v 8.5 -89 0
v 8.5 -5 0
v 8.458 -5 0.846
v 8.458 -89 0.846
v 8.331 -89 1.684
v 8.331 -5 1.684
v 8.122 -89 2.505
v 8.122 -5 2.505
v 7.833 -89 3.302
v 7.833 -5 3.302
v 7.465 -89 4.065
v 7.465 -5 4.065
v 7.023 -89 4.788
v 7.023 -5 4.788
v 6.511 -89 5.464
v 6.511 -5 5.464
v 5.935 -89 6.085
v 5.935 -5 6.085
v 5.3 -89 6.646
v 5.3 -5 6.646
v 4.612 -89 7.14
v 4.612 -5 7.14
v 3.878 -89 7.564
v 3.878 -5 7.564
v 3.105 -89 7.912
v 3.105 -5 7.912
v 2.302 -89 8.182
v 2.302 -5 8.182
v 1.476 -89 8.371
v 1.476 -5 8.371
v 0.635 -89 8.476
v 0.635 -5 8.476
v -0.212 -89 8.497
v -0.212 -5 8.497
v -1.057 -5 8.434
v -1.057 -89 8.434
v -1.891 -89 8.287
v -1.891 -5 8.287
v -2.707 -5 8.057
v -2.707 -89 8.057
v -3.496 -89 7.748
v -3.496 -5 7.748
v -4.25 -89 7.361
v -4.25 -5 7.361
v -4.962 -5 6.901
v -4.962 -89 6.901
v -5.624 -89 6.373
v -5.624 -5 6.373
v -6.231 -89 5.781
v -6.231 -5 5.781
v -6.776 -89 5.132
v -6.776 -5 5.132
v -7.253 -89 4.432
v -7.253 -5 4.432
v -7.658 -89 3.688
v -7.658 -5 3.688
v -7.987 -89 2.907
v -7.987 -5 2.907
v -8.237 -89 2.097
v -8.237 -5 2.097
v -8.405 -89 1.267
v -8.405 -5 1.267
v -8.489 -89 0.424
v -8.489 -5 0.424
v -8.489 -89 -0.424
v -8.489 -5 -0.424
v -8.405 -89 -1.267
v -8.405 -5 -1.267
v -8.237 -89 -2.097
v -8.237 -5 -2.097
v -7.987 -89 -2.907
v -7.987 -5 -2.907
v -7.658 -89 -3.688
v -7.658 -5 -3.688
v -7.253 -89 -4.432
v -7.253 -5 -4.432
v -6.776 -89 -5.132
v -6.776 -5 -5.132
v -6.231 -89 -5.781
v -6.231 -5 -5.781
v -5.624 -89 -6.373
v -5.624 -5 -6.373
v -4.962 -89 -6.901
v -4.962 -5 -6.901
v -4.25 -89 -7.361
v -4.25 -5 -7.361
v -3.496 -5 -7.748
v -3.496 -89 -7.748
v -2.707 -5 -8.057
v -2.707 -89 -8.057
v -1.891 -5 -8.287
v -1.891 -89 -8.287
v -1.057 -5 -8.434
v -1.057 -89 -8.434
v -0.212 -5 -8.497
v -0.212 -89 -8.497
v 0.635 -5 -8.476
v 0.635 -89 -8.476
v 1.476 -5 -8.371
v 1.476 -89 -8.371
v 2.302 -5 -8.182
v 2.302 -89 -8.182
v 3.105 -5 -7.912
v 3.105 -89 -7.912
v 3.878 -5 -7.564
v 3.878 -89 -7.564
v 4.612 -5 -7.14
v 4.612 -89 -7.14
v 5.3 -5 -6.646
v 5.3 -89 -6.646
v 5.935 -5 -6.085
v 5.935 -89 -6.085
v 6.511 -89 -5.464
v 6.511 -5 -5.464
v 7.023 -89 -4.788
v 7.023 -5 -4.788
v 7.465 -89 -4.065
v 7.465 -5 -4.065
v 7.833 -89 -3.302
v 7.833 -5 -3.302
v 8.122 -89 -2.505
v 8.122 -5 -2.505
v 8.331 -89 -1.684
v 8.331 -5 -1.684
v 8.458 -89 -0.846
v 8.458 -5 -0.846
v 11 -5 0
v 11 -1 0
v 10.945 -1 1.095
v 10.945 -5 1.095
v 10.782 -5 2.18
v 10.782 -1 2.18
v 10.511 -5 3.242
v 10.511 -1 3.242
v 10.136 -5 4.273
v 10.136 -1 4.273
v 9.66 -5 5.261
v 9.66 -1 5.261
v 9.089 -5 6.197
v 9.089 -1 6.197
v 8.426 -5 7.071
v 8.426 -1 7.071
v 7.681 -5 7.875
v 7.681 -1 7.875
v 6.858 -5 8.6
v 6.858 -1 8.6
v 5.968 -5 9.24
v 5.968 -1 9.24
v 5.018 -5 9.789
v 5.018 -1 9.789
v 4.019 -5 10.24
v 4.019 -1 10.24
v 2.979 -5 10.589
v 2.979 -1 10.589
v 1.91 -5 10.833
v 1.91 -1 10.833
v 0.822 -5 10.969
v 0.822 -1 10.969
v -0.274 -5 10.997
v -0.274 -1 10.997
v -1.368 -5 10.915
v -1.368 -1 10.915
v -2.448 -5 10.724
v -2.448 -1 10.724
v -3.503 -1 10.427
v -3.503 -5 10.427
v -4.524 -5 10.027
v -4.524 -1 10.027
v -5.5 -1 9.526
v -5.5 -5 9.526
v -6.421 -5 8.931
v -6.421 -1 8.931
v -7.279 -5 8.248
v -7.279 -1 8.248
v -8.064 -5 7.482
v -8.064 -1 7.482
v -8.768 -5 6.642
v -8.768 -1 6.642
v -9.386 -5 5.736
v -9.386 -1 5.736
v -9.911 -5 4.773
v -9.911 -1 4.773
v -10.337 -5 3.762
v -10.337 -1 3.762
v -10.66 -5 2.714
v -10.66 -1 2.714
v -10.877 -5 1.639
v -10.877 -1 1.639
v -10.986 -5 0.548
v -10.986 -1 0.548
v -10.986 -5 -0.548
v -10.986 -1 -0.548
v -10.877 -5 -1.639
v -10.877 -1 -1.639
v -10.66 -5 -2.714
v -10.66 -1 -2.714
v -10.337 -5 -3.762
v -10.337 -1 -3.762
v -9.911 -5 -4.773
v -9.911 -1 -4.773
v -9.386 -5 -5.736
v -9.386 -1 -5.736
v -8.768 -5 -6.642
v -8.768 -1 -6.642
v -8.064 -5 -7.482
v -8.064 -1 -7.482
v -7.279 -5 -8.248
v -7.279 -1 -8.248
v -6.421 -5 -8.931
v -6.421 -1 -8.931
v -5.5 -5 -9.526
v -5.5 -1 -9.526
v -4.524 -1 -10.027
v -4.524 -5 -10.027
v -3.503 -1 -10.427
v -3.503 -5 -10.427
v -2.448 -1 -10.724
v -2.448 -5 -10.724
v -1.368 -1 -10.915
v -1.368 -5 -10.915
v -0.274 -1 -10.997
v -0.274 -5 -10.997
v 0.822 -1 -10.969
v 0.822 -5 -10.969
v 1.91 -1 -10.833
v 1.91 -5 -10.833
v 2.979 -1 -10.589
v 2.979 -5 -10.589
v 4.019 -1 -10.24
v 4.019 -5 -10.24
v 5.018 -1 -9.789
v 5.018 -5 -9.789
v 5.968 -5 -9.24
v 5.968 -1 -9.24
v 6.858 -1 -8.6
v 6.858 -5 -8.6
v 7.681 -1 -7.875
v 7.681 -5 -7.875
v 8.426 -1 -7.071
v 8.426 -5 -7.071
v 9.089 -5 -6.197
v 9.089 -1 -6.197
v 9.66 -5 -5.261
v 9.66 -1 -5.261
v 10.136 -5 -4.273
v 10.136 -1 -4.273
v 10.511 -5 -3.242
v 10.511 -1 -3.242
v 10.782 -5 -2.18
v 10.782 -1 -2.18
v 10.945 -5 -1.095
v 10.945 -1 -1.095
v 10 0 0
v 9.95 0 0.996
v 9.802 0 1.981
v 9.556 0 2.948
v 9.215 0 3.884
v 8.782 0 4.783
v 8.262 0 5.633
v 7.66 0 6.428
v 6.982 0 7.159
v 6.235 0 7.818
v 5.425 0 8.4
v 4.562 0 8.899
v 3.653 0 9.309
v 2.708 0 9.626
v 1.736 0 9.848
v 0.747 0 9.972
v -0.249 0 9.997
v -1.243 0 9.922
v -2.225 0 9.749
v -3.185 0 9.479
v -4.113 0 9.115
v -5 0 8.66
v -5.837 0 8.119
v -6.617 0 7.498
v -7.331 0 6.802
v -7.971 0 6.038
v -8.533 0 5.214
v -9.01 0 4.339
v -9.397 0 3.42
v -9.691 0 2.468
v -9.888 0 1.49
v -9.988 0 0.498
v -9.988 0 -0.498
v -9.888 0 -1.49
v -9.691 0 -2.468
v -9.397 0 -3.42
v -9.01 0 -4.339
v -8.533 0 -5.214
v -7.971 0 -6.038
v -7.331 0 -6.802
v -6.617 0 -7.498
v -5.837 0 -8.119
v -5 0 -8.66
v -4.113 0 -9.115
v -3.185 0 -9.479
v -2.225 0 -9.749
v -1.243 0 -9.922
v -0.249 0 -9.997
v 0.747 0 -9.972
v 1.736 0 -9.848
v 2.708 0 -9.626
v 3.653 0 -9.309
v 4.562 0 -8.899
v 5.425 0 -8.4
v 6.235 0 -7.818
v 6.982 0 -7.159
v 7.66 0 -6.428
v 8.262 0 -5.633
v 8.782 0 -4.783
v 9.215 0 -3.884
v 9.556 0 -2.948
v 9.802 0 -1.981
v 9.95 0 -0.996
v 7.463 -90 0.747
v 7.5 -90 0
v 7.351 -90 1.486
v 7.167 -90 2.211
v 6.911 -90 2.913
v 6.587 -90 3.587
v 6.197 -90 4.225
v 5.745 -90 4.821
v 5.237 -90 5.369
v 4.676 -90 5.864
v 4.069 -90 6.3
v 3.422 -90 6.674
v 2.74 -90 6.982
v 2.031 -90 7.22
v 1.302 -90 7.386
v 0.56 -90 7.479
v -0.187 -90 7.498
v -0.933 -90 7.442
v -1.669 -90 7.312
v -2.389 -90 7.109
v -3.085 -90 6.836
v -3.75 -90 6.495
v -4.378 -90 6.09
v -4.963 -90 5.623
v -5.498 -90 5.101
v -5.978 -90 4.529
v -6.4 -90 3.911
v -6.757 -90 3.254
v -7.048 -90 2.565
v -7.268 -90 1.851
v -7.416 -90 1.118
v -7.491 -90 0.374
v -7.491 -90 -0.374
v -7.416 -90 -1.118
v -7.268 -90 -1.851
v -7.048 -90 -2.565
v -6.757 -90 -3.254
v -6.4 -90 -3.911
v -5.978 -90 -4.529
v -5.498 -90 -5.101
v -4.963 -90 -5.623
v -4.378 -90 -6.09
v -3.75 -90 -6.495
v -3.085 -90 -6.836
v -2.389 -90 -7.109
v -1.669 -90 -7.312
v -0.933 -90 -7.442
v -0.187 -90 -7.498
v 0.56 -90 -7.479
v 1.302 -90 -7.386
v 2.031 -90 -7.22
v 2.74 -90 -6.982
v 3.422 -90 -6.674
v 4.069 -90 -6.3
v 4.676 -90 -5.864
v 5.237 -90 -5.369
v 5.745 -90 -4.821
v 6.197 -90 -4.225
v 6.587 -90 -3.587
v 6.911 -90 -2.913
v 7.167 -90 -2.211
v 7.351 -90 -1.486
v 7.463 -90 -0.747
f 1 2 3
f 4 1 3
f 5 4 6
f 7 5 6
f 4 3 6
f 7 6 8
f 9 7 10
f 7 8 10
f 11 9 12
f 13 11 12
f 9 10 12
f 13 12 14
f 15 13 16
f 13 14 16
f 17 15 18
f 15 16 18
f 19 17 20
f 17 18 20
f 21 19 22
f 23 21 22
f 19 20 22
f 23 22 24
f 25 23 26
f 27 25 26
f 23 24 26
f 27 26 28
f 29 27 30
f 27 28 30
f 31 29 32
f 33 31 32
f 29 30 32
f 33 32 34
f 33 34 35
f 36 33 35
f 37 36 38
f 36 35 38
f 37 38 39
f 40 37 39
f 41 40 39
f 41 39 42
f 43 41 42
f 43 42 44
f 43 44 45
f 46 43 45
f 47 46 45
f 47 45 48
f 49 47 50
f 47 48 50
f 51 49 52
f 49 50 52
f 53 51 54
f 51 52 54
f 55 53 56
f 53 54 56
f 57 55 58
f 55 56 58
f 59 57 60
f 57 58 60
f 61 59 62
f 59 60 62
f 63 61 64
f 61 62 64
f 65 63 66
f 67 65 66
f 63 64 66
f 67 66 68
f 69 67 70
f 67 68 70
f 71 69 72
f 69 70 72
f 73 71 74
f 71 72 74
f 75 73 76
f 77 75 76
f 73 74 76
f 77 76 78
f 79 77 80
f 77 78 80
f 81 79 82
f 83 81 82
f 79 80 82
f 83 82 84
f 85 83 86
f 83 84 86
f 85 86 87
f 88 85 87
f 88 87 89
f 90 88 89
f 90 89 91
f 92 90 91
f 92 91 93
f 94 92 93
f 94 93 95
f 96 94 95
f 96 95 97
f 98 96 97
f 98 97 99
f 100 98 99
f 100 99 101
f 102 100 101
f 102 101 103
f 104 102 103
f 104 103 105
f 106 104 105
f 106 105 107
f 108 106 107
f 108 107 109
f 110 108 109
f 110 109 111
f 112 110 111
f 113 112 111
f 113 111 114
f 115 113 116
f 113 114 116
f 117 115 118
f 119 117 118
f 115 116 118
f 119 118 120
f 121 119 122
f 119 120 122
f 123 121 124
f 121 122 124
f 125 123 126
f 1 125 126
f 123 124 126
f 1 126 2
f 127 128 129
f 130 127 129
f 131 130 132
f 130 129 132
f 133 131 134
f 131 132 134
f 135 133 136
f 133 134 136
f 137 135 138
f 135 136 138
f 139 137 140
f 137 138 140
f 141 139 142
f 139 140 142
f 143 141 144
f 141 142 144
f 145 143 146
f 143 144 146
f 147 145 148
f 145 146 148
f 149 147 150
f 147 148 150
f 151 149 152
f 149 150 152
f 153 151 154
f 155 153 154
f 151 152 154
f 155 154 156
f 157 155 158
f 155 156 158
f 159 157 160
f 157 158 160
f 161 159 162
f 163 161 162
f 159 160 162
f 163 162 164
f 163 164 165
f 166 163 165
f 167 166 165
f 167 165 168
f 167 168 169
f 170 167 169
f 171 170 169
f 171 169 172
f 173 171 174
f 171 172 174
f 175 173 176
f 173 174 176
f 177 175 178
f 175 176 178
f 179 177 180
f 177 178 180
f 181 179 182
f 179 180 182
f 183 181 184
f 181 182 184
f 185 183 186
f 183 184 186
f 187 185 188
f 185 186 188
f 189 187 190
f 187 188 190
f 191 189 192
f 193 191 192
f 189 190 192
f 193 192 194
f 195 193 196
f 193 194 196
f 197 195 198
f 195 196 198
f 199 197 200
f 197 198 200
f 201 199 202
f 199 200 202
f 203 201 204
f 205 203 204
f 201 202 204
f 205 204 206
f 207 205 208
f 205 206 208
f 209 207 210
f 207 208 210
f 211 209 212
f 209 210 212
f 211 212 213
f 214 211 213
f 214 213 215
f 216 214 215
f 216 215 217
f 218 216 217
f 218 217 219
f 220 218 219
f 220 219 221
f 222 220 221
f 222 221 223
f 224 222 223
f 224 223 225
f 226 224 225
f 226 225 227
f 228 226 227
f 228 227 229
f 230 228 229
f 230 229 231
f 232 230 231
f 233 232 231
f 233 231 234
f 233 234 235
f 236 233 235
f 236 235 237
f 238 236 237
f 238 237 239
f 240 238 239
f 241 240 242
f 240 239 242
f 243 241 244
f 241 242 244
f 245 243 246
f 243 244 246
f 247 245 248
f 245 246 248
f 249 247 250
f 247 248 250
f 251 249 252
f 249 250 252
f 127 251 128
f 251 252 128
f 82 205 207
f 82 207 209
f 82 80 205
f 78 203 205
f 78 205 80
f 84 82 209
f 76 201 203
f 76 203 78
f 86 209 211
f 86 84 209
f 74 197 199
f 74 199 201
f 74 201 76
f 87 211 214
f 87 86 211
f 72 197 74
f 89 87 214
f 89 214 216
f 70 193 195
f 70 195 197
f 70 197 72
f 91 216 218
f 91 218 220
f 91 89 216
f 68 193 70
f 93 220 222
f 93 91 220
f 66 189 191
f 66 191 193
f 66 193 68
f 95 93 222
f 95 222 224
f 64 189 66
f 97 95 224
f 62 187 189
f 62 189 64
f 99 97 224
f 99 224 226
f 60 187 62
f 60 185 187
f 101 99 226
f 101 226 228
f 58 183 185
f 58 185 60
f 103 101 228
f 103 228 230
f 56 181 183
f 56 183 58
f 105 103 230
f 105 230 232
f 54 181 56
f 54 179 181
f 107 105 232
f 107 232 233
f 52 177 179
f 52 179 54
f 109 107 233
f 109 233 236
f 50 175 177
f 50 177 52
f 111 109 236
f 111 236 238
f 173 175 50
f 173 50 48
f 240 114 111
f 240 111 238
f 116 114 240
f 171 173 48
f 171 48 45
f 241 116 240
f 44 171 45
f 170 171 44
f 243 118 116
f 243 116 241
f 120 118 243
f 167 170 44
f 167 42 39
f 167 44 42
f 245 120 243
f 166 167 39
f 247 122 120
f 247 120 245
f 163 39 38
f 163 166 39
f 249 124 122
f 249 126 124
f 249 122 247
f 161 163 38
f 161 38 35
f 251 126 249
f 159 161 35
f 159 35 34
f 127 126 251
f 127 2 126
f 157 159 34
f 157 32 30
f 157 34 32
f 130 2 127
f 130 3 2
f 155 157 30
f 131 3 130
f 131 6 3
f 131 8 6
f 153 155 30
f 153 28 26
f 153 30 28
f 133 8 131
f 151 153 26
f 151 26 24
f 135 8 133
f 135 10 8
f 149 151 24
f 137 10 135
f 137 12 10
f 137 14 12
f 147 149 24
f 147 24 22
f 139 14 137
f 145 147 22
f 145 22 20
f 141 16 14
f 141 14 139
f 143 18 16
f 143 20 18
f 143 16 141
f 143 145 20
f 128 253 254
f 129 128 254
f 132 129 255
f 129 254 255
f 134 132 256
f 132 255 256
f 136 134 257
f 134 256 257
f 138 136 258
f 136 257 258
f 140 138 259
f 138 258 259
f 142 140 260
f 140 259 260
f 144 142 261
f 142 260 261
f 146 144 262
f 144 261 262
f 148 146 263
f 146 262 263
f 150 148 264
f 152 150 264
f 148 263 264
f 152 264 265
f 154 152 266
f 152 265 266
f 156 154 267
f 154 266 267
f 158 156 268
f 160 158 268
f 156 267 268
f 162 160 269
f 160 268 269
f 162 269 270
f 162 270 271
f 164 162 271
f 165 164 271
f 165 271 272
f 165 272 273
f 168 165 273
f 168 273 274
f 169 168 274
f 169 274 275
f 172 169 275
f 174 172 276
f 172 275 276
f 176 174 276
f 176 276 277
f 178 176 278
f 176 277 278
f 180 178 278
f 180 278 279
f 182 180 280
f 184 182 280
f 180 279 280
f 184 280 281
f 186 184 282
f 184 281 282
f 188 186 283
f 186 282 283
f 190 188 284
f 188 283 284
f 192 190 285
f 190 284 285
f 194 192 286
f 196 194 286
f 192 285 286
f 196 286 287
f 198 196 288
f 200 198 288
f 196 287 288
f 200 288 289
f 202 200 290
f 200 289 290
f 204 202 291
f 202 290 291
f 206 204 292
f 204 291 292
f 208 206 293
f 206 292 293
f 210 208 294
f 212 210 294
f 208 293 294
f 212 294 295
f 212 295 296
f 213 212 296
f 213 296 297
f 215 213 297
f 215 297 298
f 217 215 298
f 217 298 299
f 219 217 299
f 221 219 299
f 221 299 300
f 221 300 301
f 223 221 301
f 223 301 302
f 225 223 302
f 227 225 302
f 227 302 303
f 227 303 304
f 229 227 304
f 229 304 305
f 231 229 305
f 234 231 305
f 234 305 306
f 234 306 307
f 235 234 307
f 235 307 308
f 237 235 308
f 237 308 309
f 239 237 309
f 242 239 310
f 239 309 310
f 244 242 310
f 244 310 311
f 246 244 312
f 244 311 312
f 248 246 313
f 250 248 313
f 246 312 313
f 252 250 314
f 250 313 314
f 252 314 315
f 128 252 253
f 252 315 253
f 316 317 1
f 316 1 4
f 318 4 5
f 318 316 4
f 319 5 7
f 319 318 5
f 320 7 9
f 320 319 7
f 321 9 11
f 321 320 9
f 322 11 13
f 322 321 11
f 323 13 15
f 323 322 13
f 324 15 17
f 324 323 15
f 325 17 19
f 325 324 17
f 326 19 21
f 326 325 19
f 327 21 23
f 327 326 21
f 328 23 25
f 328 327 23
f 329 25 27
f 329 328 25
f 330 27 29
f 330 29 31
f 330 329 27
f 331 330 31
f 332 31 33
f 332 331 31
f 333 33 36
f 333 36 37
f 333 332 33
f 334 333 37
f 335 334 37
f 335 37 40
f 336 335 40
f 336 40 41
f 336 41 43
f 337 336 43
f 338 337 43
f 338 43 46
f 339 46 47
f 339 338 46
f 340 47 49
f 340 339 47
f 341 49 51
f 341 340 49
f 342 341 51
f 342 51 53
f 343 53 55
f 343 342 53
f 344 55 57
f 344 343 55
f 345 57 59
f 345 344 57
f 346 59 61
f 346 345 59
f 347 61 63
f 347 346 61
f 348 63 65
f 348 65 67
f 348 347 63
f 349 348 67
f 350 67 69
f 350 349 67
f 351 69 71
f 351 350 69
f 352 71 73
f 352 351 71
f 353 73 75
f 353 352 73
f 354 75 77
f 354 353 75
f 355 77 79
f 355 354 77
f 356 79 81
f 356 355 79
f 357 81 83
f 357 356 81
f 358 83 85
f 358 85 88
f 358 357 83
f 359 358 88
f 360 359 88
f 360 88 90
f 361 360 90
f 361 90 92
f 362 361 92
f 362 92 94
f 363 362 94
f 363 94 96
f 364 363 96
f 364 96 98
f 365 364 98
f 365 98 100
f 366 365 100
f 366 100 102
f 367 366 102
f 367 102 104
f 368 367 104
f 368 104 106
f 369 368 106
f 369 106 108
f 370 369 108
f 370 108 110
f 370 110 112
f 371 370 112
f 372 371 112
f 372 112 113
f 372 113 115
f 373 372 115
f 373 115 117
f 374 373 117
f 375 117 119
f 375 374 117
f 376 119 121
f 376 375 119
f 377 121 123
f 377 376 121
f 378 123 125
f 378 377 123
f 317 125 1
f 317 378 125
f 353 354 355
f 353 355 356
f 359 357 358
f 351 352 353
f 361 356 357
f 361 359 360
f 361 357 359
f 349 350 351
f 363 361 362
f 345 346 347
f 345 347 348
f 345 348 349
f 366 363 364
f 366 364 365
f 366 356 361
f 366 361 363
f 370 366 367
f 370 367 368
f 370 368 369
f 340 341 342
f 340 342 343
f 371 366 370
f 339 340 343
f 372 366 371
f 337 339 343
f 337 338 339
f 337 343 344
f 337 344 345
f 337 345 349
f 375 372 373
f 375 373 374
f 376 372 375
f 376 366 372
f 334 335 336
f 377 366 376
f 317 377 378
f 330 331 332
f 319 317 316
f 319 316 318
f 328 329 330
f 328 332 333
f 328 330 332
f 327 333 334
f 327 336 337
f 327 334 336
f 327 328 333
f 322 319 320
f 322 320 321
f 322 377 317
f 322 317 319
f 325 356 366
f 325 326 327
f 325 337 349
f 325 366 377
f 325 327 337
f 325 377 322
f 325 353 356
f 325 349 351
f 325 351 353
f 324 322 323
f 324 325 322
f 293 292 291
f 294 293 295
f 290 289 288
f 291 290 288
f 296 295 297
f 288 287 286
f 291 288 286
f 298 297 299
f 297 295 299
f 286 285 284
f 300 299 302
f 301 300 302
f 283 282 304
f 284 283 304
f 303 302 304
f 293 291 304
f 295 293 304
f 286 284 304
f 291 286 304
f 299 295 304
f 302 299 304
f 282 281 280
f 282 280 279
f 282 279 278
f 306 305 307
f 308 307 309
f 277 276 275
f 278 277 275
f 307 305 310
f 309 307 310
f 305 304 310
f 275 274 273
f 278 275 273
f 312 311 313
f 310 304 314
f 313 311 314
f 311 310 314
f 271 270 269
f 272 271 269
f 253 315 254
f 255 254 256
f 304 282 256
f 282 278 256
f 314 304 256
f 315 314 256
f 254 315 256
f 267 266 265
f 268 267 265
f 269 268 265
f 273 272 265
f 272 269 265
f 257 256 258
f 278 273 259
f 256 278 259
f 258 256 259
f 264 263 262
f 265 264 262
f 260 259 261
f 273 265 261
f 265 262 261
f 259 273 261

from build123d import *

# Parameters (mm, degrees)
F0_R     = 11
F1_DEPTH = 5
F2_R     = 8.5
F3_DEPTH = 85
F4_SIZE  = 1
F5_SIZE  = 1


with BuildPart() as f1:
    # F0 (on Front) → F1 (new body)
    with BuildSketch(Plane.XZ):
        Circle(F0_R)
    extrude(amount=F1_DEPTH)

    # F2 (on face) → F3 (join)
    with BuildSketch(Plane.XZ.offset(5)):
        Circle(F2_R)
    extrude(amount=F3_DEPTH)

    # F4
    f4_edges = [f1.edges().sort_by_distance(p)[0] for p in [
        (-11, 0, 0),
    ]]
    chamfer(f4_edges, length=F4_SIZE)

    # F5
    f5_edges = [f1.edges().sort_by_distance(p)[0] for p in [
        (-8.5, -90, 0),
    ]]
    chamfer(f5_edges, length=F5_SIZE)


solid = f1.part
